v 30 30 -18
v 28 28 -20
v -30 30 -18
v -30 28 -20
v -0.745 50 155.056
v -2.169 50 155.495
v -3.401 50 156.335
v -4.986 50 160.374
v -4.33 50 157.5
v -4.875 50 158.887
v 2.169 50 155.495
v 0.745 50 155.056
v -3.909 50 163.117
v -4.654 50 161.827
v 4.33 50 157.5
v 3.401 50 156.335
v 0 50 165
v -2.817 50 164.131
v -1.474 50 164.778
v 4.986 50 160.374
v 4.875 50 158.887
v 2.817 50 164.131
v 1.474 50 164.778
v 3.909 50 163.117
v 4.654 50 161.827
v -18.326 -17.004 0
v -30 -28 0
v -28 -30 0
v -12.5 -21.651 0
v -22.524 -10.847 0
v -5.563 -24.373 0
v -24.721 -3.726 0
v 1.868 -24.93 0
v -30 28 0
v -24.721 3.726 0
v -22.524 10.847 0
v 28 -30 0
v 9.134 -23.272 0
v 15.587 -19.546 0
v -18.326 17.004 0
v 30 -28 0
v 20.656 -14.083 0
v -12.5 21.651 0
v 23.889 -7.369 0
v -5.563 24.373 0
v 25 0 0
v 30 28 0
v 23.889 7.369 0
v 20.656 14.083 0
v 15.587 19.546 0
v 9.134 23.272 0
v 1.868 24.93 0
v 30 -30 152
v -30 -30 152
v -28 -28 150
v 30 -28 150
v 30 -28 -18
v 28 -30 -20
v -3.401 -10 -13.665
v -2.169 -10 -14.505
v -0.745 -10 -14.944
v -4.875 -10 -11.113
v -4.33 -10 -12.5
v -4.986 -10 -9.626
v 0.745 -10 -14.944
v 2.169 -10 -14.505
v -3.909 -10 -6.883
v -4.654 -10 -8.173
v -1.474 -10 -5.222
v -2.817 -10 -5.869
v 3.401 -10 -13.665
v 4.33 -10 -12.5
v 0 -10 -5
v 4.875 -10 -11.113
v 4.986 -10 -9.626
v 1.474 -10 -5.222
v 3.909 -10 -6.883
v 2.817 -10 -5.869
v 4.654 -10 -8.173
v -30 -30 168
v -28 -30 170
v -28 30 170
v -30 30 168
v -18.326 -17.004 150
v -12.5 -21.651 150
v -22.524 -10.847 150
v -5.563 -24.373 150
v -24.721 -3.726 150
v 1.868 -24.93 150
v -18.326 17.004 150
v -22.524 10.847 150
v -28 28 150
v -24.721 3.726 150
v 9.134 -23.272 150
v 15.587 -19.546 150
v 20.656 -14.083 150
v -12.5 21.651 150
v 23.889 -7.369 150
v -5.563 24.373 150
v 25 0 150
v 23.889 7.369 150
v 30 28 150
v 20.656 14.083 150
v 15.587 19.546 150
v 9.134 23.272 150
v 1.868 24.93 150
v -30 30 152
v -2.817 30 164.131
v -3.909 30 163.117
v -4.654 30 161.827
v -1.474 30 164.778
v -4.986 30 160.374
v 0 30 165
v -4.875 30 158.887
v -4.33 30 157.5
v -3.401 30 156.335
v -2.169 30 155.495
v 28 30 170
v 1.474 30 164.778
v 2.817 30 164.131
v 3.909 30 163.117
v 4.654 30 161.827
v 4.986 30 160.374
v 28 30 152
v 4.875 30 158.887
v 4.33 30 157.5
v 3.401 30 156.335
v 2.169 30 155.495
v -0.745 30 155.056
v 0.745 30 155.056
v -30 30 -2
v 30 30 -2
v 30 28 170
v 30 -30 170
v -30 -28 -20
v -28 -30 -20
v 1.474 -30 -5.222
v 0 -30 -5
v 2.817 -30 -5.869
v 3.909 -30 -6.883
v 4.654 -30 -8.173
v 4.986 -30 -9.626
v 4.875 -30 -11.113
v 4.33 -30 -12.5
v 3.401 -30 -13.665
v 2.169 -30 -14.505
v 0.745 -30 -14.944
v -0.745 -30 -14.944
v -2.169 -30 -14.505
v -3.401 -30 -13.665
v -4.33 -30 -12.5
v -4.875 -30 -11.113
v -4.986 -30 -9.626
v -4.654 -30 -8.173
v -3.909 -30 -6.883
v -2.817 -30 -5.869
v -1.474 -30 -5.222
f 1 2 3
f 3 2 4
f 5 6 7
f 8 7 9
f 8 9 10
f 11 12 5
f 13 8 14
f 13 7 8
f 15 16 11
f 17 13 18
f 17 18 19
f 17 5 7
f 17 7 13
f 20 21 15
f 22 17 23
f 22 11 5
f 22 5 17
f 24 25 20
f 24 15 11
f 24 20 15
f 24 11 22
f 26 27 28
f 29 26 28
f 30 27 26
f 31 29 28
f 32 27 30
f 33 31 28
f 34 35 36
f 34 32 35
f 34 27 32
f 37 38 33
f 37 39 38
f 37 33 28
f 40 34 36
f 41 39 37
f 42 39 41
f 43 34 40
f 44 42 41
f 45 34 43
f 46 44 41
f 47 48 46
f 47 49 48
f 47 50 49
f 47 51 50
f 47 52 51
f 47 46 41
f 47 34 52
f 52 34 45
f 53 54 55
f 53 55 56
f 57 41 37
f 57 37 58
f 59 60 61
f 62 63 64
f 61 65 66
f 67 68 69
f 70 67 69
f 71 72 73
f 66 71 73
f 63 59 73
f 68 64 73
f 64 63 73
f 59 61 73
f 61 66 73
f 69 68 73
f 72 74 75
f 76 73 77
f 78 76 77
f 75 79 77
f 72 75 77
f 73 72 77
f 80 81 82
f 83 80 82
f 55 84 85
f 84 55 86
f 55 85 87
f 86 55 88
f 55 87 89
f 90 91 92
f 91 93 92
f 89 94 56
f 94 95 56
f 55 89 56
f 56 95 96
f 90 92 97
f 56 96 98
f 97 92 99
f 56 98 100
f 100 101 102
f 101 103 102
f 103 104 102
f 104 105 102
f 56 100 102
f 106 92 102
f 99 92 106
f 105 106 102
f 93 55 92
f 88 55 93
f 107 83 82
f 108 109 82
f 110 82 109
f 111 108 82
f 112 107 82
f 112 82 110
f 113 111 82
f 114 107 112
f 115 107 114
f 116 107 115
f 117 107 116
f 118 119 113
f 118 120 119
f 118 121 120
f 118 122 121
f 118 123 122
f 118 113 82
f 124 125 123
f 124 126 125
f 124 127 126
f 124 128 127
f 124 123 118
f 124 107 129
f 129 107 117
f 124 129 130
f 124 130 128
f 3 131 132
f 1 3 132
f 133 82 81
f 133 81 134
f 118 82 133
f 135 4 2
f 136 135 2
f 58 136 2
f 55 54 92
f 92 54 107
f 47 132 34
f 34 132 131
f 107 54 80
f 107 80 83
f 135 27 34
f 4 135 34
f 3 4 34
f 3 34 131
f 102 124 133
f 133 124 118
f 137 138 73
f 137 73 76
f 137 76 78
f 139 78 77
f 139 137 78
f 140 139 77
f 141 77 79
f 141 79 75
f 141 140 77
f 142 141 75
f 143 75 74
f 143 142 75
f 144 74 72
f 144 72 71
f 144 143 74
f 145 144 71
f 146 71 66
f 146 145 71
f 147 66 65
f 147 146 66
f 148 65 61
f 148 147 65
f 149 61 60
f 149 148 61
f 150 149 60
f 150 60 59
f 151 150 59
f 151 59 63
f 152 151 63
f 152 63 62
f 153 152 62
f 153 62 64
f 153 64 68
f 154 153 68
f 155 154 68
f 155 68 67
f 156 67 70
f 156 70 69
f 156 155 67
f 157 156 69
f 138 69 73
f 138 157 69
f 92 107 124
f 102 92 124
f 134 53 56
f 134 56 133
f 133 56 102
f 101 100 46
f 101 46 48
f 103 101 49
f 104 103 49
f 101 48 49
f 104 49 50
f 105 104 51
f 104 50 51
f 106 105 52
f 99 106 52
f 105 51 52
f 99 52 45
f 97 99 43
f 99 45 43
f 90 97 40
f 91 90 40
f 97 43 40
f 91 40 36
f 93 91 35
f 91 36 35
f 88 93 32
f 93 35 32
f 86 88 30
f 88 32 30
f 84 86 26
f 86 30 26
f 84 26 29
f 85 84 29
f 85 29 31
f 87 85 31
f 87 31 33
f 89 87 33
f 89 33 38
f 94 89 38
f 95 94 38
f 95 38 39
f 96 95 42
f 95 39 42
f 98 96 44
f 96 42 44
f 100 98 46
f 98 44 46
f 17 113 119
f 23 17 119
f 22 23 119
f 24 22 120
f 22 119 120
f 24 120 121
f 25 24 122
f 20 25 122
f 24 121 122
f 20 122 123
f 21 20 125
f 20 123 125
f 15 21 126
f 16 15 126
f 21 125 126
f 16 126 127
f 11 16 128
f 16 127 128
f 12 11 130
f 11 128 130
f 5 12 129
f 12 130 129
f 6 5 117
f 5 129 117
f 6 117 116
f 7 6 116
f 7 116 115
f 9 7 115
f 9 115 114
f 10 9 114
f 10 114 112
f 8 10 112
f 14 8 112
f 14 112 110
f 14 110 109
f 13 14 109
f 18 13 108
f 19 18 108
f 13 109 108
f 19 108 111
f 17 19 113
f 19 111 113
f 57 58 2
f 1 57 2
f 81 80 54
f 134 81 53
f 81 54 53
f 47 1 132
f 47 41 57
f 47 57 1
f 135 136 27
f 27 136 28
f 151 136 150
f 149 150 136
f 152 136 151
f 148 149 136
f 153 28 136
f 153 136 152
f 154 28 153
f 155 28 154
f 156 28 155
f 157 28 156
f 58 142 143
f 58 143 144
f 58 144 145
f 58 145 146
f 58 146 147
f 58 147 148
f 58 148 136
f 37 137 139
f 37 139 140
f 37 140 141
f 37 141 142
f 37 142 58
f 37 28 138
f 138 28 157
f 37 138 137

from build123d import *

# Parameters (mm, degrees)
SKETCH1_R            = 25
BOSS_EXTRUDE1_DEPTH  = 150
SKETCH2_W            = 60
SKETCH2_H            = 60
BOSS_EXTRUDE2_DEPTH  = 20
SKETCH3_W            = 60
SKETCH3_H            = 60
BOSS_EXTRUDE3_DEPTH  = 20
SKETCH4_R            = 5
CUT_EXTRUDE1_DEPTH   = 20
SKETCH5_R            = 5
BOSS_EXTRUDE4_DEPTH  = 20
CHAMFER1_SIZE        = 2
CHAMFER2_SIZE        = 2
SKETCH6_R            = 25
BOSS_EXTRUDE5_DEPTH  = 150
SKETCH7_W            = 60
SKETCH7_H            = 60
BOSS_EXTRUDE6_DEPTH  = 20
SKETCH8_W            = 60
SKETCH8_H            = 60
BOSS_EXTRUDE7_DEPTH  = 20
SKETCH9_R            = 5
CUT_EXTRUDE2_DEPTH   = 20
SKETCH10_R           = 5
BOSS_EXTRUDE8_DEPTH  = 20
CHAMFER3_SIZE        = 2
CHAMFER4_SIZE        = 2
SKETCH11_R           = 25
BOSS_EXTRUDE9_DEPTH  = 150
SKETCH12_W           = 60
SKETCH12_H           = 60
BOSS_EXTRUDE10_DEPTH = 20
SKETCH13_W           = 60
SKETCH13_H           = 60
BOSS_EXTRUDE11_DEPTH = 20
SKETCH14_R           = 5
CUT_EXTRUDE3_DEPTH   = 20
SKETCH15_R           = 5
BOSS_EXTRUDE12_DEPTH = 20
CHAMFER5_SIZE        = 2
CHAMFER6_SIZE        = 2


with BuildPart() as part:
    # Sketch1 → Boss-Extrude1 (new body)
    with BuildSketch(Plane.XY):
        Circle(SKETCH1_R)
    extrude(amount=BOSS_EXTRUDE1_DEPTH)

    # Sketch2 → Boss-Extrude2 (add)
    with BuildSketch(Plane.XY):
        Rectangle(SKETCH2_W, SKETCH2_H)
    extrude(amount=-BOSS_EXTRUDE2_DEPTH)

    # Sketch3 → Boss-Extrude3 (add)
    with BuildSketch(Plane.XY.offset(150)):
        Rectangle(SKETCH3_W, SKETCH3_H)
    extrude(amount=BOSS_EXTRUDE3_DEPTH)

    # Sketch4 → Cut-Extrude1 (cut)
    with BuildSketch(Plane(origin=(0, -30, 0), x_dir=(1, 0, 0), z_dir=(0, 1, 0))):
        with Locations((0, 10)):
            Circle(SKETCH4_R)
    extrude(amount=CUT_EXTRUDE1_DEPTH, mode=Mode.SUBTRACT)

    # Sketch5 → Boss-Extrude4 (add)
    with BuildSketch(Plane(origin=(0, 30, 0), x_dir=(1, 0, 0), z_dir=(0, 1, 0))):
        with Locations((0, -160)):
            Circle(SKETCH5_R)
    extrude(amount=BOSS_EXTRUDE4_DEPTH)

    # Chamfer1
    chamfer1_edges = [part.edges().sort_by_distance(p)[0] for p in [
        (-30, -30, -10),
        (-30, 30, -10),
        (30, -30, -10),
        (30, 0, -20),
    ]]
    chamfer(chamfer1_edges, length=CHAMFER1_SIZE)

    # Chamfer2
    chamfer2_edges = [part.edges().sort_by_distance(p)[0] for p in [
        (30, 30, 160),
        (0, -30, 150),
        (-30, 0, 170),
        (-30, 30, 160),
    ]]
    chamfer(chamfer2_edges, length=CHAMFER2_SIZE)

    # Sketch6 → Boss-Extrude5 (add)
    with BuildSketch(Plane.XY):
        Circle(SKETCH6_R)
    extrude(amount=BOSS_EXTRUDE5_DEPTH)

    # Sketch7 → Boss-Extrude6 (add)
    with BuildSketch(Plane.XY):
        Rectangle(SKETCH7_W, SKETCH7_H)
    extrude(amount=-BOSS_EXTRUDE6_DEPTH)

    # Sketch8 → Boss-Extrude7 (add)
    with BuildSketch(Plane.XY.offset(150)):
        Rectangle(SKETCH8_W, SKETCH8_H)
    extrude(amount=BOSS_EXTRUDE7_DEPTH)

    # Sketch9 → Cut-Extrude2 (cut)
    with BuildSketch(Plane(origin=(0, -30, 0), x_dir=(1, 0, 0), z_dir=(0, 1, 0))):
        with Locations((0, 10)):
            Circle(SKETCH9_R)
    extrude(amount=CUT_EXTRUDE2_DEPTH, mode=Mode.SUBTRACT)

    # Sketch10 → Boss-Extrude8 (add)
    with BuildSketch(Plane(origin=(0, 30, 0), x_dir=(1, 0, 0), z_dir=(0, 1, 0))):
        with Locations((0, -160)):
            Circle(SKETCH10_R)
    extrude(amount=BOSS_EXTRUDE8_DEPTH)

    # Chamfer3
    chamfer3_edges = [part.edges().sort_by_distance(p)[0] for p in [
        (30, -30, -10),
        (-30, 0, -20),
        (0, -30, -20),
        (30, 0, -20),
        (-30, 0, 0),
    ]]
    chamfer(chamfer3_edges, length=CHAMFER3_SIZE)

    # Chamfer4
    chamfer4_edges = [part.edges().sort_by_distance(p)[0] for p in [
        (0, 30, 170),
        (30, 30, 160),
        (0, -30, 150),
        (-30, 0, 150),
    ]]
    chamfer(chamfer4_edges, length=CHAMFER4_SIZE)

    # Sketch11 → Boss-Extrude9 (add)
    with BuildSketch(Plane.XY):
        Circle(SKETCH11_R)
    extrude(amount=BOSS_EXTRUDE9_DEPTH)

    # Sketch12 → Boss-Extrude10 (add)
    with BuildSketch(Plane.XY):
        Rectangle(SKETCH12_W, SKETCH12_H)
    extrude(amount=-BOSS_EXTRUDE10_DEPTH)

    # Sketch13 → Boss-Extrude11 (add)
    with BuildSketch(Plane.XY.offset(150)):
        Rectangle(SKETCH13_W, SKETCH13_H)
    extrude(amount=BOSS_EXTRUDE11_DEPTH)

    # Sketch14 → Cut-Extrude3 (cut)
    with BuildSketch(Plane(origin=(0, -30, 0), x_dir=(1, 0, 0), z_dir=(0, 1, 0))):
        with Locations((0, 10)):
            Circle(SKETCH14_R)
    extrude(amount=CUT_EXTRUDE3_DEPTH, mode=Mode.SUBTRACT)

    # Sketch15 → Boss-Extrude12 (add)
    with BuildSketch(Plane(origin=(0, 30, 0), x_dir=(1, 0, 0), z_dir=(0, 1, 0))):
        with Locations((0, -160)):
            Circle(SKETCH15_R)
    extrude(amount=BOSS_EXTRUDE12_DEPTH)

    # Chamfer5
    chamfer5_edges = [part.edges().sort_by_distance(p)[0] for p in [
        (-30, -30, -10),
        (30, -30, -10),
        (0, 30, -20),
        (30, 0, -20),
        (0, 30, 0),
    ]]
    chamfer(chamfer5_edges, length=CHAMFER5_SIZE)

    # Chamfer6
    chamfer6_edges = [part.edges().sort_by_distance(p)[0] for p in [
        (-30, 0, 170),
        (30, 30, 160),
        (0, -30, 150),
        (-30, 0, 150),
        (0, 30, 150),
    ]]
    chamfer(chamfer6_edges, length=CHAMFER6_SIZE)


solid = part.part
